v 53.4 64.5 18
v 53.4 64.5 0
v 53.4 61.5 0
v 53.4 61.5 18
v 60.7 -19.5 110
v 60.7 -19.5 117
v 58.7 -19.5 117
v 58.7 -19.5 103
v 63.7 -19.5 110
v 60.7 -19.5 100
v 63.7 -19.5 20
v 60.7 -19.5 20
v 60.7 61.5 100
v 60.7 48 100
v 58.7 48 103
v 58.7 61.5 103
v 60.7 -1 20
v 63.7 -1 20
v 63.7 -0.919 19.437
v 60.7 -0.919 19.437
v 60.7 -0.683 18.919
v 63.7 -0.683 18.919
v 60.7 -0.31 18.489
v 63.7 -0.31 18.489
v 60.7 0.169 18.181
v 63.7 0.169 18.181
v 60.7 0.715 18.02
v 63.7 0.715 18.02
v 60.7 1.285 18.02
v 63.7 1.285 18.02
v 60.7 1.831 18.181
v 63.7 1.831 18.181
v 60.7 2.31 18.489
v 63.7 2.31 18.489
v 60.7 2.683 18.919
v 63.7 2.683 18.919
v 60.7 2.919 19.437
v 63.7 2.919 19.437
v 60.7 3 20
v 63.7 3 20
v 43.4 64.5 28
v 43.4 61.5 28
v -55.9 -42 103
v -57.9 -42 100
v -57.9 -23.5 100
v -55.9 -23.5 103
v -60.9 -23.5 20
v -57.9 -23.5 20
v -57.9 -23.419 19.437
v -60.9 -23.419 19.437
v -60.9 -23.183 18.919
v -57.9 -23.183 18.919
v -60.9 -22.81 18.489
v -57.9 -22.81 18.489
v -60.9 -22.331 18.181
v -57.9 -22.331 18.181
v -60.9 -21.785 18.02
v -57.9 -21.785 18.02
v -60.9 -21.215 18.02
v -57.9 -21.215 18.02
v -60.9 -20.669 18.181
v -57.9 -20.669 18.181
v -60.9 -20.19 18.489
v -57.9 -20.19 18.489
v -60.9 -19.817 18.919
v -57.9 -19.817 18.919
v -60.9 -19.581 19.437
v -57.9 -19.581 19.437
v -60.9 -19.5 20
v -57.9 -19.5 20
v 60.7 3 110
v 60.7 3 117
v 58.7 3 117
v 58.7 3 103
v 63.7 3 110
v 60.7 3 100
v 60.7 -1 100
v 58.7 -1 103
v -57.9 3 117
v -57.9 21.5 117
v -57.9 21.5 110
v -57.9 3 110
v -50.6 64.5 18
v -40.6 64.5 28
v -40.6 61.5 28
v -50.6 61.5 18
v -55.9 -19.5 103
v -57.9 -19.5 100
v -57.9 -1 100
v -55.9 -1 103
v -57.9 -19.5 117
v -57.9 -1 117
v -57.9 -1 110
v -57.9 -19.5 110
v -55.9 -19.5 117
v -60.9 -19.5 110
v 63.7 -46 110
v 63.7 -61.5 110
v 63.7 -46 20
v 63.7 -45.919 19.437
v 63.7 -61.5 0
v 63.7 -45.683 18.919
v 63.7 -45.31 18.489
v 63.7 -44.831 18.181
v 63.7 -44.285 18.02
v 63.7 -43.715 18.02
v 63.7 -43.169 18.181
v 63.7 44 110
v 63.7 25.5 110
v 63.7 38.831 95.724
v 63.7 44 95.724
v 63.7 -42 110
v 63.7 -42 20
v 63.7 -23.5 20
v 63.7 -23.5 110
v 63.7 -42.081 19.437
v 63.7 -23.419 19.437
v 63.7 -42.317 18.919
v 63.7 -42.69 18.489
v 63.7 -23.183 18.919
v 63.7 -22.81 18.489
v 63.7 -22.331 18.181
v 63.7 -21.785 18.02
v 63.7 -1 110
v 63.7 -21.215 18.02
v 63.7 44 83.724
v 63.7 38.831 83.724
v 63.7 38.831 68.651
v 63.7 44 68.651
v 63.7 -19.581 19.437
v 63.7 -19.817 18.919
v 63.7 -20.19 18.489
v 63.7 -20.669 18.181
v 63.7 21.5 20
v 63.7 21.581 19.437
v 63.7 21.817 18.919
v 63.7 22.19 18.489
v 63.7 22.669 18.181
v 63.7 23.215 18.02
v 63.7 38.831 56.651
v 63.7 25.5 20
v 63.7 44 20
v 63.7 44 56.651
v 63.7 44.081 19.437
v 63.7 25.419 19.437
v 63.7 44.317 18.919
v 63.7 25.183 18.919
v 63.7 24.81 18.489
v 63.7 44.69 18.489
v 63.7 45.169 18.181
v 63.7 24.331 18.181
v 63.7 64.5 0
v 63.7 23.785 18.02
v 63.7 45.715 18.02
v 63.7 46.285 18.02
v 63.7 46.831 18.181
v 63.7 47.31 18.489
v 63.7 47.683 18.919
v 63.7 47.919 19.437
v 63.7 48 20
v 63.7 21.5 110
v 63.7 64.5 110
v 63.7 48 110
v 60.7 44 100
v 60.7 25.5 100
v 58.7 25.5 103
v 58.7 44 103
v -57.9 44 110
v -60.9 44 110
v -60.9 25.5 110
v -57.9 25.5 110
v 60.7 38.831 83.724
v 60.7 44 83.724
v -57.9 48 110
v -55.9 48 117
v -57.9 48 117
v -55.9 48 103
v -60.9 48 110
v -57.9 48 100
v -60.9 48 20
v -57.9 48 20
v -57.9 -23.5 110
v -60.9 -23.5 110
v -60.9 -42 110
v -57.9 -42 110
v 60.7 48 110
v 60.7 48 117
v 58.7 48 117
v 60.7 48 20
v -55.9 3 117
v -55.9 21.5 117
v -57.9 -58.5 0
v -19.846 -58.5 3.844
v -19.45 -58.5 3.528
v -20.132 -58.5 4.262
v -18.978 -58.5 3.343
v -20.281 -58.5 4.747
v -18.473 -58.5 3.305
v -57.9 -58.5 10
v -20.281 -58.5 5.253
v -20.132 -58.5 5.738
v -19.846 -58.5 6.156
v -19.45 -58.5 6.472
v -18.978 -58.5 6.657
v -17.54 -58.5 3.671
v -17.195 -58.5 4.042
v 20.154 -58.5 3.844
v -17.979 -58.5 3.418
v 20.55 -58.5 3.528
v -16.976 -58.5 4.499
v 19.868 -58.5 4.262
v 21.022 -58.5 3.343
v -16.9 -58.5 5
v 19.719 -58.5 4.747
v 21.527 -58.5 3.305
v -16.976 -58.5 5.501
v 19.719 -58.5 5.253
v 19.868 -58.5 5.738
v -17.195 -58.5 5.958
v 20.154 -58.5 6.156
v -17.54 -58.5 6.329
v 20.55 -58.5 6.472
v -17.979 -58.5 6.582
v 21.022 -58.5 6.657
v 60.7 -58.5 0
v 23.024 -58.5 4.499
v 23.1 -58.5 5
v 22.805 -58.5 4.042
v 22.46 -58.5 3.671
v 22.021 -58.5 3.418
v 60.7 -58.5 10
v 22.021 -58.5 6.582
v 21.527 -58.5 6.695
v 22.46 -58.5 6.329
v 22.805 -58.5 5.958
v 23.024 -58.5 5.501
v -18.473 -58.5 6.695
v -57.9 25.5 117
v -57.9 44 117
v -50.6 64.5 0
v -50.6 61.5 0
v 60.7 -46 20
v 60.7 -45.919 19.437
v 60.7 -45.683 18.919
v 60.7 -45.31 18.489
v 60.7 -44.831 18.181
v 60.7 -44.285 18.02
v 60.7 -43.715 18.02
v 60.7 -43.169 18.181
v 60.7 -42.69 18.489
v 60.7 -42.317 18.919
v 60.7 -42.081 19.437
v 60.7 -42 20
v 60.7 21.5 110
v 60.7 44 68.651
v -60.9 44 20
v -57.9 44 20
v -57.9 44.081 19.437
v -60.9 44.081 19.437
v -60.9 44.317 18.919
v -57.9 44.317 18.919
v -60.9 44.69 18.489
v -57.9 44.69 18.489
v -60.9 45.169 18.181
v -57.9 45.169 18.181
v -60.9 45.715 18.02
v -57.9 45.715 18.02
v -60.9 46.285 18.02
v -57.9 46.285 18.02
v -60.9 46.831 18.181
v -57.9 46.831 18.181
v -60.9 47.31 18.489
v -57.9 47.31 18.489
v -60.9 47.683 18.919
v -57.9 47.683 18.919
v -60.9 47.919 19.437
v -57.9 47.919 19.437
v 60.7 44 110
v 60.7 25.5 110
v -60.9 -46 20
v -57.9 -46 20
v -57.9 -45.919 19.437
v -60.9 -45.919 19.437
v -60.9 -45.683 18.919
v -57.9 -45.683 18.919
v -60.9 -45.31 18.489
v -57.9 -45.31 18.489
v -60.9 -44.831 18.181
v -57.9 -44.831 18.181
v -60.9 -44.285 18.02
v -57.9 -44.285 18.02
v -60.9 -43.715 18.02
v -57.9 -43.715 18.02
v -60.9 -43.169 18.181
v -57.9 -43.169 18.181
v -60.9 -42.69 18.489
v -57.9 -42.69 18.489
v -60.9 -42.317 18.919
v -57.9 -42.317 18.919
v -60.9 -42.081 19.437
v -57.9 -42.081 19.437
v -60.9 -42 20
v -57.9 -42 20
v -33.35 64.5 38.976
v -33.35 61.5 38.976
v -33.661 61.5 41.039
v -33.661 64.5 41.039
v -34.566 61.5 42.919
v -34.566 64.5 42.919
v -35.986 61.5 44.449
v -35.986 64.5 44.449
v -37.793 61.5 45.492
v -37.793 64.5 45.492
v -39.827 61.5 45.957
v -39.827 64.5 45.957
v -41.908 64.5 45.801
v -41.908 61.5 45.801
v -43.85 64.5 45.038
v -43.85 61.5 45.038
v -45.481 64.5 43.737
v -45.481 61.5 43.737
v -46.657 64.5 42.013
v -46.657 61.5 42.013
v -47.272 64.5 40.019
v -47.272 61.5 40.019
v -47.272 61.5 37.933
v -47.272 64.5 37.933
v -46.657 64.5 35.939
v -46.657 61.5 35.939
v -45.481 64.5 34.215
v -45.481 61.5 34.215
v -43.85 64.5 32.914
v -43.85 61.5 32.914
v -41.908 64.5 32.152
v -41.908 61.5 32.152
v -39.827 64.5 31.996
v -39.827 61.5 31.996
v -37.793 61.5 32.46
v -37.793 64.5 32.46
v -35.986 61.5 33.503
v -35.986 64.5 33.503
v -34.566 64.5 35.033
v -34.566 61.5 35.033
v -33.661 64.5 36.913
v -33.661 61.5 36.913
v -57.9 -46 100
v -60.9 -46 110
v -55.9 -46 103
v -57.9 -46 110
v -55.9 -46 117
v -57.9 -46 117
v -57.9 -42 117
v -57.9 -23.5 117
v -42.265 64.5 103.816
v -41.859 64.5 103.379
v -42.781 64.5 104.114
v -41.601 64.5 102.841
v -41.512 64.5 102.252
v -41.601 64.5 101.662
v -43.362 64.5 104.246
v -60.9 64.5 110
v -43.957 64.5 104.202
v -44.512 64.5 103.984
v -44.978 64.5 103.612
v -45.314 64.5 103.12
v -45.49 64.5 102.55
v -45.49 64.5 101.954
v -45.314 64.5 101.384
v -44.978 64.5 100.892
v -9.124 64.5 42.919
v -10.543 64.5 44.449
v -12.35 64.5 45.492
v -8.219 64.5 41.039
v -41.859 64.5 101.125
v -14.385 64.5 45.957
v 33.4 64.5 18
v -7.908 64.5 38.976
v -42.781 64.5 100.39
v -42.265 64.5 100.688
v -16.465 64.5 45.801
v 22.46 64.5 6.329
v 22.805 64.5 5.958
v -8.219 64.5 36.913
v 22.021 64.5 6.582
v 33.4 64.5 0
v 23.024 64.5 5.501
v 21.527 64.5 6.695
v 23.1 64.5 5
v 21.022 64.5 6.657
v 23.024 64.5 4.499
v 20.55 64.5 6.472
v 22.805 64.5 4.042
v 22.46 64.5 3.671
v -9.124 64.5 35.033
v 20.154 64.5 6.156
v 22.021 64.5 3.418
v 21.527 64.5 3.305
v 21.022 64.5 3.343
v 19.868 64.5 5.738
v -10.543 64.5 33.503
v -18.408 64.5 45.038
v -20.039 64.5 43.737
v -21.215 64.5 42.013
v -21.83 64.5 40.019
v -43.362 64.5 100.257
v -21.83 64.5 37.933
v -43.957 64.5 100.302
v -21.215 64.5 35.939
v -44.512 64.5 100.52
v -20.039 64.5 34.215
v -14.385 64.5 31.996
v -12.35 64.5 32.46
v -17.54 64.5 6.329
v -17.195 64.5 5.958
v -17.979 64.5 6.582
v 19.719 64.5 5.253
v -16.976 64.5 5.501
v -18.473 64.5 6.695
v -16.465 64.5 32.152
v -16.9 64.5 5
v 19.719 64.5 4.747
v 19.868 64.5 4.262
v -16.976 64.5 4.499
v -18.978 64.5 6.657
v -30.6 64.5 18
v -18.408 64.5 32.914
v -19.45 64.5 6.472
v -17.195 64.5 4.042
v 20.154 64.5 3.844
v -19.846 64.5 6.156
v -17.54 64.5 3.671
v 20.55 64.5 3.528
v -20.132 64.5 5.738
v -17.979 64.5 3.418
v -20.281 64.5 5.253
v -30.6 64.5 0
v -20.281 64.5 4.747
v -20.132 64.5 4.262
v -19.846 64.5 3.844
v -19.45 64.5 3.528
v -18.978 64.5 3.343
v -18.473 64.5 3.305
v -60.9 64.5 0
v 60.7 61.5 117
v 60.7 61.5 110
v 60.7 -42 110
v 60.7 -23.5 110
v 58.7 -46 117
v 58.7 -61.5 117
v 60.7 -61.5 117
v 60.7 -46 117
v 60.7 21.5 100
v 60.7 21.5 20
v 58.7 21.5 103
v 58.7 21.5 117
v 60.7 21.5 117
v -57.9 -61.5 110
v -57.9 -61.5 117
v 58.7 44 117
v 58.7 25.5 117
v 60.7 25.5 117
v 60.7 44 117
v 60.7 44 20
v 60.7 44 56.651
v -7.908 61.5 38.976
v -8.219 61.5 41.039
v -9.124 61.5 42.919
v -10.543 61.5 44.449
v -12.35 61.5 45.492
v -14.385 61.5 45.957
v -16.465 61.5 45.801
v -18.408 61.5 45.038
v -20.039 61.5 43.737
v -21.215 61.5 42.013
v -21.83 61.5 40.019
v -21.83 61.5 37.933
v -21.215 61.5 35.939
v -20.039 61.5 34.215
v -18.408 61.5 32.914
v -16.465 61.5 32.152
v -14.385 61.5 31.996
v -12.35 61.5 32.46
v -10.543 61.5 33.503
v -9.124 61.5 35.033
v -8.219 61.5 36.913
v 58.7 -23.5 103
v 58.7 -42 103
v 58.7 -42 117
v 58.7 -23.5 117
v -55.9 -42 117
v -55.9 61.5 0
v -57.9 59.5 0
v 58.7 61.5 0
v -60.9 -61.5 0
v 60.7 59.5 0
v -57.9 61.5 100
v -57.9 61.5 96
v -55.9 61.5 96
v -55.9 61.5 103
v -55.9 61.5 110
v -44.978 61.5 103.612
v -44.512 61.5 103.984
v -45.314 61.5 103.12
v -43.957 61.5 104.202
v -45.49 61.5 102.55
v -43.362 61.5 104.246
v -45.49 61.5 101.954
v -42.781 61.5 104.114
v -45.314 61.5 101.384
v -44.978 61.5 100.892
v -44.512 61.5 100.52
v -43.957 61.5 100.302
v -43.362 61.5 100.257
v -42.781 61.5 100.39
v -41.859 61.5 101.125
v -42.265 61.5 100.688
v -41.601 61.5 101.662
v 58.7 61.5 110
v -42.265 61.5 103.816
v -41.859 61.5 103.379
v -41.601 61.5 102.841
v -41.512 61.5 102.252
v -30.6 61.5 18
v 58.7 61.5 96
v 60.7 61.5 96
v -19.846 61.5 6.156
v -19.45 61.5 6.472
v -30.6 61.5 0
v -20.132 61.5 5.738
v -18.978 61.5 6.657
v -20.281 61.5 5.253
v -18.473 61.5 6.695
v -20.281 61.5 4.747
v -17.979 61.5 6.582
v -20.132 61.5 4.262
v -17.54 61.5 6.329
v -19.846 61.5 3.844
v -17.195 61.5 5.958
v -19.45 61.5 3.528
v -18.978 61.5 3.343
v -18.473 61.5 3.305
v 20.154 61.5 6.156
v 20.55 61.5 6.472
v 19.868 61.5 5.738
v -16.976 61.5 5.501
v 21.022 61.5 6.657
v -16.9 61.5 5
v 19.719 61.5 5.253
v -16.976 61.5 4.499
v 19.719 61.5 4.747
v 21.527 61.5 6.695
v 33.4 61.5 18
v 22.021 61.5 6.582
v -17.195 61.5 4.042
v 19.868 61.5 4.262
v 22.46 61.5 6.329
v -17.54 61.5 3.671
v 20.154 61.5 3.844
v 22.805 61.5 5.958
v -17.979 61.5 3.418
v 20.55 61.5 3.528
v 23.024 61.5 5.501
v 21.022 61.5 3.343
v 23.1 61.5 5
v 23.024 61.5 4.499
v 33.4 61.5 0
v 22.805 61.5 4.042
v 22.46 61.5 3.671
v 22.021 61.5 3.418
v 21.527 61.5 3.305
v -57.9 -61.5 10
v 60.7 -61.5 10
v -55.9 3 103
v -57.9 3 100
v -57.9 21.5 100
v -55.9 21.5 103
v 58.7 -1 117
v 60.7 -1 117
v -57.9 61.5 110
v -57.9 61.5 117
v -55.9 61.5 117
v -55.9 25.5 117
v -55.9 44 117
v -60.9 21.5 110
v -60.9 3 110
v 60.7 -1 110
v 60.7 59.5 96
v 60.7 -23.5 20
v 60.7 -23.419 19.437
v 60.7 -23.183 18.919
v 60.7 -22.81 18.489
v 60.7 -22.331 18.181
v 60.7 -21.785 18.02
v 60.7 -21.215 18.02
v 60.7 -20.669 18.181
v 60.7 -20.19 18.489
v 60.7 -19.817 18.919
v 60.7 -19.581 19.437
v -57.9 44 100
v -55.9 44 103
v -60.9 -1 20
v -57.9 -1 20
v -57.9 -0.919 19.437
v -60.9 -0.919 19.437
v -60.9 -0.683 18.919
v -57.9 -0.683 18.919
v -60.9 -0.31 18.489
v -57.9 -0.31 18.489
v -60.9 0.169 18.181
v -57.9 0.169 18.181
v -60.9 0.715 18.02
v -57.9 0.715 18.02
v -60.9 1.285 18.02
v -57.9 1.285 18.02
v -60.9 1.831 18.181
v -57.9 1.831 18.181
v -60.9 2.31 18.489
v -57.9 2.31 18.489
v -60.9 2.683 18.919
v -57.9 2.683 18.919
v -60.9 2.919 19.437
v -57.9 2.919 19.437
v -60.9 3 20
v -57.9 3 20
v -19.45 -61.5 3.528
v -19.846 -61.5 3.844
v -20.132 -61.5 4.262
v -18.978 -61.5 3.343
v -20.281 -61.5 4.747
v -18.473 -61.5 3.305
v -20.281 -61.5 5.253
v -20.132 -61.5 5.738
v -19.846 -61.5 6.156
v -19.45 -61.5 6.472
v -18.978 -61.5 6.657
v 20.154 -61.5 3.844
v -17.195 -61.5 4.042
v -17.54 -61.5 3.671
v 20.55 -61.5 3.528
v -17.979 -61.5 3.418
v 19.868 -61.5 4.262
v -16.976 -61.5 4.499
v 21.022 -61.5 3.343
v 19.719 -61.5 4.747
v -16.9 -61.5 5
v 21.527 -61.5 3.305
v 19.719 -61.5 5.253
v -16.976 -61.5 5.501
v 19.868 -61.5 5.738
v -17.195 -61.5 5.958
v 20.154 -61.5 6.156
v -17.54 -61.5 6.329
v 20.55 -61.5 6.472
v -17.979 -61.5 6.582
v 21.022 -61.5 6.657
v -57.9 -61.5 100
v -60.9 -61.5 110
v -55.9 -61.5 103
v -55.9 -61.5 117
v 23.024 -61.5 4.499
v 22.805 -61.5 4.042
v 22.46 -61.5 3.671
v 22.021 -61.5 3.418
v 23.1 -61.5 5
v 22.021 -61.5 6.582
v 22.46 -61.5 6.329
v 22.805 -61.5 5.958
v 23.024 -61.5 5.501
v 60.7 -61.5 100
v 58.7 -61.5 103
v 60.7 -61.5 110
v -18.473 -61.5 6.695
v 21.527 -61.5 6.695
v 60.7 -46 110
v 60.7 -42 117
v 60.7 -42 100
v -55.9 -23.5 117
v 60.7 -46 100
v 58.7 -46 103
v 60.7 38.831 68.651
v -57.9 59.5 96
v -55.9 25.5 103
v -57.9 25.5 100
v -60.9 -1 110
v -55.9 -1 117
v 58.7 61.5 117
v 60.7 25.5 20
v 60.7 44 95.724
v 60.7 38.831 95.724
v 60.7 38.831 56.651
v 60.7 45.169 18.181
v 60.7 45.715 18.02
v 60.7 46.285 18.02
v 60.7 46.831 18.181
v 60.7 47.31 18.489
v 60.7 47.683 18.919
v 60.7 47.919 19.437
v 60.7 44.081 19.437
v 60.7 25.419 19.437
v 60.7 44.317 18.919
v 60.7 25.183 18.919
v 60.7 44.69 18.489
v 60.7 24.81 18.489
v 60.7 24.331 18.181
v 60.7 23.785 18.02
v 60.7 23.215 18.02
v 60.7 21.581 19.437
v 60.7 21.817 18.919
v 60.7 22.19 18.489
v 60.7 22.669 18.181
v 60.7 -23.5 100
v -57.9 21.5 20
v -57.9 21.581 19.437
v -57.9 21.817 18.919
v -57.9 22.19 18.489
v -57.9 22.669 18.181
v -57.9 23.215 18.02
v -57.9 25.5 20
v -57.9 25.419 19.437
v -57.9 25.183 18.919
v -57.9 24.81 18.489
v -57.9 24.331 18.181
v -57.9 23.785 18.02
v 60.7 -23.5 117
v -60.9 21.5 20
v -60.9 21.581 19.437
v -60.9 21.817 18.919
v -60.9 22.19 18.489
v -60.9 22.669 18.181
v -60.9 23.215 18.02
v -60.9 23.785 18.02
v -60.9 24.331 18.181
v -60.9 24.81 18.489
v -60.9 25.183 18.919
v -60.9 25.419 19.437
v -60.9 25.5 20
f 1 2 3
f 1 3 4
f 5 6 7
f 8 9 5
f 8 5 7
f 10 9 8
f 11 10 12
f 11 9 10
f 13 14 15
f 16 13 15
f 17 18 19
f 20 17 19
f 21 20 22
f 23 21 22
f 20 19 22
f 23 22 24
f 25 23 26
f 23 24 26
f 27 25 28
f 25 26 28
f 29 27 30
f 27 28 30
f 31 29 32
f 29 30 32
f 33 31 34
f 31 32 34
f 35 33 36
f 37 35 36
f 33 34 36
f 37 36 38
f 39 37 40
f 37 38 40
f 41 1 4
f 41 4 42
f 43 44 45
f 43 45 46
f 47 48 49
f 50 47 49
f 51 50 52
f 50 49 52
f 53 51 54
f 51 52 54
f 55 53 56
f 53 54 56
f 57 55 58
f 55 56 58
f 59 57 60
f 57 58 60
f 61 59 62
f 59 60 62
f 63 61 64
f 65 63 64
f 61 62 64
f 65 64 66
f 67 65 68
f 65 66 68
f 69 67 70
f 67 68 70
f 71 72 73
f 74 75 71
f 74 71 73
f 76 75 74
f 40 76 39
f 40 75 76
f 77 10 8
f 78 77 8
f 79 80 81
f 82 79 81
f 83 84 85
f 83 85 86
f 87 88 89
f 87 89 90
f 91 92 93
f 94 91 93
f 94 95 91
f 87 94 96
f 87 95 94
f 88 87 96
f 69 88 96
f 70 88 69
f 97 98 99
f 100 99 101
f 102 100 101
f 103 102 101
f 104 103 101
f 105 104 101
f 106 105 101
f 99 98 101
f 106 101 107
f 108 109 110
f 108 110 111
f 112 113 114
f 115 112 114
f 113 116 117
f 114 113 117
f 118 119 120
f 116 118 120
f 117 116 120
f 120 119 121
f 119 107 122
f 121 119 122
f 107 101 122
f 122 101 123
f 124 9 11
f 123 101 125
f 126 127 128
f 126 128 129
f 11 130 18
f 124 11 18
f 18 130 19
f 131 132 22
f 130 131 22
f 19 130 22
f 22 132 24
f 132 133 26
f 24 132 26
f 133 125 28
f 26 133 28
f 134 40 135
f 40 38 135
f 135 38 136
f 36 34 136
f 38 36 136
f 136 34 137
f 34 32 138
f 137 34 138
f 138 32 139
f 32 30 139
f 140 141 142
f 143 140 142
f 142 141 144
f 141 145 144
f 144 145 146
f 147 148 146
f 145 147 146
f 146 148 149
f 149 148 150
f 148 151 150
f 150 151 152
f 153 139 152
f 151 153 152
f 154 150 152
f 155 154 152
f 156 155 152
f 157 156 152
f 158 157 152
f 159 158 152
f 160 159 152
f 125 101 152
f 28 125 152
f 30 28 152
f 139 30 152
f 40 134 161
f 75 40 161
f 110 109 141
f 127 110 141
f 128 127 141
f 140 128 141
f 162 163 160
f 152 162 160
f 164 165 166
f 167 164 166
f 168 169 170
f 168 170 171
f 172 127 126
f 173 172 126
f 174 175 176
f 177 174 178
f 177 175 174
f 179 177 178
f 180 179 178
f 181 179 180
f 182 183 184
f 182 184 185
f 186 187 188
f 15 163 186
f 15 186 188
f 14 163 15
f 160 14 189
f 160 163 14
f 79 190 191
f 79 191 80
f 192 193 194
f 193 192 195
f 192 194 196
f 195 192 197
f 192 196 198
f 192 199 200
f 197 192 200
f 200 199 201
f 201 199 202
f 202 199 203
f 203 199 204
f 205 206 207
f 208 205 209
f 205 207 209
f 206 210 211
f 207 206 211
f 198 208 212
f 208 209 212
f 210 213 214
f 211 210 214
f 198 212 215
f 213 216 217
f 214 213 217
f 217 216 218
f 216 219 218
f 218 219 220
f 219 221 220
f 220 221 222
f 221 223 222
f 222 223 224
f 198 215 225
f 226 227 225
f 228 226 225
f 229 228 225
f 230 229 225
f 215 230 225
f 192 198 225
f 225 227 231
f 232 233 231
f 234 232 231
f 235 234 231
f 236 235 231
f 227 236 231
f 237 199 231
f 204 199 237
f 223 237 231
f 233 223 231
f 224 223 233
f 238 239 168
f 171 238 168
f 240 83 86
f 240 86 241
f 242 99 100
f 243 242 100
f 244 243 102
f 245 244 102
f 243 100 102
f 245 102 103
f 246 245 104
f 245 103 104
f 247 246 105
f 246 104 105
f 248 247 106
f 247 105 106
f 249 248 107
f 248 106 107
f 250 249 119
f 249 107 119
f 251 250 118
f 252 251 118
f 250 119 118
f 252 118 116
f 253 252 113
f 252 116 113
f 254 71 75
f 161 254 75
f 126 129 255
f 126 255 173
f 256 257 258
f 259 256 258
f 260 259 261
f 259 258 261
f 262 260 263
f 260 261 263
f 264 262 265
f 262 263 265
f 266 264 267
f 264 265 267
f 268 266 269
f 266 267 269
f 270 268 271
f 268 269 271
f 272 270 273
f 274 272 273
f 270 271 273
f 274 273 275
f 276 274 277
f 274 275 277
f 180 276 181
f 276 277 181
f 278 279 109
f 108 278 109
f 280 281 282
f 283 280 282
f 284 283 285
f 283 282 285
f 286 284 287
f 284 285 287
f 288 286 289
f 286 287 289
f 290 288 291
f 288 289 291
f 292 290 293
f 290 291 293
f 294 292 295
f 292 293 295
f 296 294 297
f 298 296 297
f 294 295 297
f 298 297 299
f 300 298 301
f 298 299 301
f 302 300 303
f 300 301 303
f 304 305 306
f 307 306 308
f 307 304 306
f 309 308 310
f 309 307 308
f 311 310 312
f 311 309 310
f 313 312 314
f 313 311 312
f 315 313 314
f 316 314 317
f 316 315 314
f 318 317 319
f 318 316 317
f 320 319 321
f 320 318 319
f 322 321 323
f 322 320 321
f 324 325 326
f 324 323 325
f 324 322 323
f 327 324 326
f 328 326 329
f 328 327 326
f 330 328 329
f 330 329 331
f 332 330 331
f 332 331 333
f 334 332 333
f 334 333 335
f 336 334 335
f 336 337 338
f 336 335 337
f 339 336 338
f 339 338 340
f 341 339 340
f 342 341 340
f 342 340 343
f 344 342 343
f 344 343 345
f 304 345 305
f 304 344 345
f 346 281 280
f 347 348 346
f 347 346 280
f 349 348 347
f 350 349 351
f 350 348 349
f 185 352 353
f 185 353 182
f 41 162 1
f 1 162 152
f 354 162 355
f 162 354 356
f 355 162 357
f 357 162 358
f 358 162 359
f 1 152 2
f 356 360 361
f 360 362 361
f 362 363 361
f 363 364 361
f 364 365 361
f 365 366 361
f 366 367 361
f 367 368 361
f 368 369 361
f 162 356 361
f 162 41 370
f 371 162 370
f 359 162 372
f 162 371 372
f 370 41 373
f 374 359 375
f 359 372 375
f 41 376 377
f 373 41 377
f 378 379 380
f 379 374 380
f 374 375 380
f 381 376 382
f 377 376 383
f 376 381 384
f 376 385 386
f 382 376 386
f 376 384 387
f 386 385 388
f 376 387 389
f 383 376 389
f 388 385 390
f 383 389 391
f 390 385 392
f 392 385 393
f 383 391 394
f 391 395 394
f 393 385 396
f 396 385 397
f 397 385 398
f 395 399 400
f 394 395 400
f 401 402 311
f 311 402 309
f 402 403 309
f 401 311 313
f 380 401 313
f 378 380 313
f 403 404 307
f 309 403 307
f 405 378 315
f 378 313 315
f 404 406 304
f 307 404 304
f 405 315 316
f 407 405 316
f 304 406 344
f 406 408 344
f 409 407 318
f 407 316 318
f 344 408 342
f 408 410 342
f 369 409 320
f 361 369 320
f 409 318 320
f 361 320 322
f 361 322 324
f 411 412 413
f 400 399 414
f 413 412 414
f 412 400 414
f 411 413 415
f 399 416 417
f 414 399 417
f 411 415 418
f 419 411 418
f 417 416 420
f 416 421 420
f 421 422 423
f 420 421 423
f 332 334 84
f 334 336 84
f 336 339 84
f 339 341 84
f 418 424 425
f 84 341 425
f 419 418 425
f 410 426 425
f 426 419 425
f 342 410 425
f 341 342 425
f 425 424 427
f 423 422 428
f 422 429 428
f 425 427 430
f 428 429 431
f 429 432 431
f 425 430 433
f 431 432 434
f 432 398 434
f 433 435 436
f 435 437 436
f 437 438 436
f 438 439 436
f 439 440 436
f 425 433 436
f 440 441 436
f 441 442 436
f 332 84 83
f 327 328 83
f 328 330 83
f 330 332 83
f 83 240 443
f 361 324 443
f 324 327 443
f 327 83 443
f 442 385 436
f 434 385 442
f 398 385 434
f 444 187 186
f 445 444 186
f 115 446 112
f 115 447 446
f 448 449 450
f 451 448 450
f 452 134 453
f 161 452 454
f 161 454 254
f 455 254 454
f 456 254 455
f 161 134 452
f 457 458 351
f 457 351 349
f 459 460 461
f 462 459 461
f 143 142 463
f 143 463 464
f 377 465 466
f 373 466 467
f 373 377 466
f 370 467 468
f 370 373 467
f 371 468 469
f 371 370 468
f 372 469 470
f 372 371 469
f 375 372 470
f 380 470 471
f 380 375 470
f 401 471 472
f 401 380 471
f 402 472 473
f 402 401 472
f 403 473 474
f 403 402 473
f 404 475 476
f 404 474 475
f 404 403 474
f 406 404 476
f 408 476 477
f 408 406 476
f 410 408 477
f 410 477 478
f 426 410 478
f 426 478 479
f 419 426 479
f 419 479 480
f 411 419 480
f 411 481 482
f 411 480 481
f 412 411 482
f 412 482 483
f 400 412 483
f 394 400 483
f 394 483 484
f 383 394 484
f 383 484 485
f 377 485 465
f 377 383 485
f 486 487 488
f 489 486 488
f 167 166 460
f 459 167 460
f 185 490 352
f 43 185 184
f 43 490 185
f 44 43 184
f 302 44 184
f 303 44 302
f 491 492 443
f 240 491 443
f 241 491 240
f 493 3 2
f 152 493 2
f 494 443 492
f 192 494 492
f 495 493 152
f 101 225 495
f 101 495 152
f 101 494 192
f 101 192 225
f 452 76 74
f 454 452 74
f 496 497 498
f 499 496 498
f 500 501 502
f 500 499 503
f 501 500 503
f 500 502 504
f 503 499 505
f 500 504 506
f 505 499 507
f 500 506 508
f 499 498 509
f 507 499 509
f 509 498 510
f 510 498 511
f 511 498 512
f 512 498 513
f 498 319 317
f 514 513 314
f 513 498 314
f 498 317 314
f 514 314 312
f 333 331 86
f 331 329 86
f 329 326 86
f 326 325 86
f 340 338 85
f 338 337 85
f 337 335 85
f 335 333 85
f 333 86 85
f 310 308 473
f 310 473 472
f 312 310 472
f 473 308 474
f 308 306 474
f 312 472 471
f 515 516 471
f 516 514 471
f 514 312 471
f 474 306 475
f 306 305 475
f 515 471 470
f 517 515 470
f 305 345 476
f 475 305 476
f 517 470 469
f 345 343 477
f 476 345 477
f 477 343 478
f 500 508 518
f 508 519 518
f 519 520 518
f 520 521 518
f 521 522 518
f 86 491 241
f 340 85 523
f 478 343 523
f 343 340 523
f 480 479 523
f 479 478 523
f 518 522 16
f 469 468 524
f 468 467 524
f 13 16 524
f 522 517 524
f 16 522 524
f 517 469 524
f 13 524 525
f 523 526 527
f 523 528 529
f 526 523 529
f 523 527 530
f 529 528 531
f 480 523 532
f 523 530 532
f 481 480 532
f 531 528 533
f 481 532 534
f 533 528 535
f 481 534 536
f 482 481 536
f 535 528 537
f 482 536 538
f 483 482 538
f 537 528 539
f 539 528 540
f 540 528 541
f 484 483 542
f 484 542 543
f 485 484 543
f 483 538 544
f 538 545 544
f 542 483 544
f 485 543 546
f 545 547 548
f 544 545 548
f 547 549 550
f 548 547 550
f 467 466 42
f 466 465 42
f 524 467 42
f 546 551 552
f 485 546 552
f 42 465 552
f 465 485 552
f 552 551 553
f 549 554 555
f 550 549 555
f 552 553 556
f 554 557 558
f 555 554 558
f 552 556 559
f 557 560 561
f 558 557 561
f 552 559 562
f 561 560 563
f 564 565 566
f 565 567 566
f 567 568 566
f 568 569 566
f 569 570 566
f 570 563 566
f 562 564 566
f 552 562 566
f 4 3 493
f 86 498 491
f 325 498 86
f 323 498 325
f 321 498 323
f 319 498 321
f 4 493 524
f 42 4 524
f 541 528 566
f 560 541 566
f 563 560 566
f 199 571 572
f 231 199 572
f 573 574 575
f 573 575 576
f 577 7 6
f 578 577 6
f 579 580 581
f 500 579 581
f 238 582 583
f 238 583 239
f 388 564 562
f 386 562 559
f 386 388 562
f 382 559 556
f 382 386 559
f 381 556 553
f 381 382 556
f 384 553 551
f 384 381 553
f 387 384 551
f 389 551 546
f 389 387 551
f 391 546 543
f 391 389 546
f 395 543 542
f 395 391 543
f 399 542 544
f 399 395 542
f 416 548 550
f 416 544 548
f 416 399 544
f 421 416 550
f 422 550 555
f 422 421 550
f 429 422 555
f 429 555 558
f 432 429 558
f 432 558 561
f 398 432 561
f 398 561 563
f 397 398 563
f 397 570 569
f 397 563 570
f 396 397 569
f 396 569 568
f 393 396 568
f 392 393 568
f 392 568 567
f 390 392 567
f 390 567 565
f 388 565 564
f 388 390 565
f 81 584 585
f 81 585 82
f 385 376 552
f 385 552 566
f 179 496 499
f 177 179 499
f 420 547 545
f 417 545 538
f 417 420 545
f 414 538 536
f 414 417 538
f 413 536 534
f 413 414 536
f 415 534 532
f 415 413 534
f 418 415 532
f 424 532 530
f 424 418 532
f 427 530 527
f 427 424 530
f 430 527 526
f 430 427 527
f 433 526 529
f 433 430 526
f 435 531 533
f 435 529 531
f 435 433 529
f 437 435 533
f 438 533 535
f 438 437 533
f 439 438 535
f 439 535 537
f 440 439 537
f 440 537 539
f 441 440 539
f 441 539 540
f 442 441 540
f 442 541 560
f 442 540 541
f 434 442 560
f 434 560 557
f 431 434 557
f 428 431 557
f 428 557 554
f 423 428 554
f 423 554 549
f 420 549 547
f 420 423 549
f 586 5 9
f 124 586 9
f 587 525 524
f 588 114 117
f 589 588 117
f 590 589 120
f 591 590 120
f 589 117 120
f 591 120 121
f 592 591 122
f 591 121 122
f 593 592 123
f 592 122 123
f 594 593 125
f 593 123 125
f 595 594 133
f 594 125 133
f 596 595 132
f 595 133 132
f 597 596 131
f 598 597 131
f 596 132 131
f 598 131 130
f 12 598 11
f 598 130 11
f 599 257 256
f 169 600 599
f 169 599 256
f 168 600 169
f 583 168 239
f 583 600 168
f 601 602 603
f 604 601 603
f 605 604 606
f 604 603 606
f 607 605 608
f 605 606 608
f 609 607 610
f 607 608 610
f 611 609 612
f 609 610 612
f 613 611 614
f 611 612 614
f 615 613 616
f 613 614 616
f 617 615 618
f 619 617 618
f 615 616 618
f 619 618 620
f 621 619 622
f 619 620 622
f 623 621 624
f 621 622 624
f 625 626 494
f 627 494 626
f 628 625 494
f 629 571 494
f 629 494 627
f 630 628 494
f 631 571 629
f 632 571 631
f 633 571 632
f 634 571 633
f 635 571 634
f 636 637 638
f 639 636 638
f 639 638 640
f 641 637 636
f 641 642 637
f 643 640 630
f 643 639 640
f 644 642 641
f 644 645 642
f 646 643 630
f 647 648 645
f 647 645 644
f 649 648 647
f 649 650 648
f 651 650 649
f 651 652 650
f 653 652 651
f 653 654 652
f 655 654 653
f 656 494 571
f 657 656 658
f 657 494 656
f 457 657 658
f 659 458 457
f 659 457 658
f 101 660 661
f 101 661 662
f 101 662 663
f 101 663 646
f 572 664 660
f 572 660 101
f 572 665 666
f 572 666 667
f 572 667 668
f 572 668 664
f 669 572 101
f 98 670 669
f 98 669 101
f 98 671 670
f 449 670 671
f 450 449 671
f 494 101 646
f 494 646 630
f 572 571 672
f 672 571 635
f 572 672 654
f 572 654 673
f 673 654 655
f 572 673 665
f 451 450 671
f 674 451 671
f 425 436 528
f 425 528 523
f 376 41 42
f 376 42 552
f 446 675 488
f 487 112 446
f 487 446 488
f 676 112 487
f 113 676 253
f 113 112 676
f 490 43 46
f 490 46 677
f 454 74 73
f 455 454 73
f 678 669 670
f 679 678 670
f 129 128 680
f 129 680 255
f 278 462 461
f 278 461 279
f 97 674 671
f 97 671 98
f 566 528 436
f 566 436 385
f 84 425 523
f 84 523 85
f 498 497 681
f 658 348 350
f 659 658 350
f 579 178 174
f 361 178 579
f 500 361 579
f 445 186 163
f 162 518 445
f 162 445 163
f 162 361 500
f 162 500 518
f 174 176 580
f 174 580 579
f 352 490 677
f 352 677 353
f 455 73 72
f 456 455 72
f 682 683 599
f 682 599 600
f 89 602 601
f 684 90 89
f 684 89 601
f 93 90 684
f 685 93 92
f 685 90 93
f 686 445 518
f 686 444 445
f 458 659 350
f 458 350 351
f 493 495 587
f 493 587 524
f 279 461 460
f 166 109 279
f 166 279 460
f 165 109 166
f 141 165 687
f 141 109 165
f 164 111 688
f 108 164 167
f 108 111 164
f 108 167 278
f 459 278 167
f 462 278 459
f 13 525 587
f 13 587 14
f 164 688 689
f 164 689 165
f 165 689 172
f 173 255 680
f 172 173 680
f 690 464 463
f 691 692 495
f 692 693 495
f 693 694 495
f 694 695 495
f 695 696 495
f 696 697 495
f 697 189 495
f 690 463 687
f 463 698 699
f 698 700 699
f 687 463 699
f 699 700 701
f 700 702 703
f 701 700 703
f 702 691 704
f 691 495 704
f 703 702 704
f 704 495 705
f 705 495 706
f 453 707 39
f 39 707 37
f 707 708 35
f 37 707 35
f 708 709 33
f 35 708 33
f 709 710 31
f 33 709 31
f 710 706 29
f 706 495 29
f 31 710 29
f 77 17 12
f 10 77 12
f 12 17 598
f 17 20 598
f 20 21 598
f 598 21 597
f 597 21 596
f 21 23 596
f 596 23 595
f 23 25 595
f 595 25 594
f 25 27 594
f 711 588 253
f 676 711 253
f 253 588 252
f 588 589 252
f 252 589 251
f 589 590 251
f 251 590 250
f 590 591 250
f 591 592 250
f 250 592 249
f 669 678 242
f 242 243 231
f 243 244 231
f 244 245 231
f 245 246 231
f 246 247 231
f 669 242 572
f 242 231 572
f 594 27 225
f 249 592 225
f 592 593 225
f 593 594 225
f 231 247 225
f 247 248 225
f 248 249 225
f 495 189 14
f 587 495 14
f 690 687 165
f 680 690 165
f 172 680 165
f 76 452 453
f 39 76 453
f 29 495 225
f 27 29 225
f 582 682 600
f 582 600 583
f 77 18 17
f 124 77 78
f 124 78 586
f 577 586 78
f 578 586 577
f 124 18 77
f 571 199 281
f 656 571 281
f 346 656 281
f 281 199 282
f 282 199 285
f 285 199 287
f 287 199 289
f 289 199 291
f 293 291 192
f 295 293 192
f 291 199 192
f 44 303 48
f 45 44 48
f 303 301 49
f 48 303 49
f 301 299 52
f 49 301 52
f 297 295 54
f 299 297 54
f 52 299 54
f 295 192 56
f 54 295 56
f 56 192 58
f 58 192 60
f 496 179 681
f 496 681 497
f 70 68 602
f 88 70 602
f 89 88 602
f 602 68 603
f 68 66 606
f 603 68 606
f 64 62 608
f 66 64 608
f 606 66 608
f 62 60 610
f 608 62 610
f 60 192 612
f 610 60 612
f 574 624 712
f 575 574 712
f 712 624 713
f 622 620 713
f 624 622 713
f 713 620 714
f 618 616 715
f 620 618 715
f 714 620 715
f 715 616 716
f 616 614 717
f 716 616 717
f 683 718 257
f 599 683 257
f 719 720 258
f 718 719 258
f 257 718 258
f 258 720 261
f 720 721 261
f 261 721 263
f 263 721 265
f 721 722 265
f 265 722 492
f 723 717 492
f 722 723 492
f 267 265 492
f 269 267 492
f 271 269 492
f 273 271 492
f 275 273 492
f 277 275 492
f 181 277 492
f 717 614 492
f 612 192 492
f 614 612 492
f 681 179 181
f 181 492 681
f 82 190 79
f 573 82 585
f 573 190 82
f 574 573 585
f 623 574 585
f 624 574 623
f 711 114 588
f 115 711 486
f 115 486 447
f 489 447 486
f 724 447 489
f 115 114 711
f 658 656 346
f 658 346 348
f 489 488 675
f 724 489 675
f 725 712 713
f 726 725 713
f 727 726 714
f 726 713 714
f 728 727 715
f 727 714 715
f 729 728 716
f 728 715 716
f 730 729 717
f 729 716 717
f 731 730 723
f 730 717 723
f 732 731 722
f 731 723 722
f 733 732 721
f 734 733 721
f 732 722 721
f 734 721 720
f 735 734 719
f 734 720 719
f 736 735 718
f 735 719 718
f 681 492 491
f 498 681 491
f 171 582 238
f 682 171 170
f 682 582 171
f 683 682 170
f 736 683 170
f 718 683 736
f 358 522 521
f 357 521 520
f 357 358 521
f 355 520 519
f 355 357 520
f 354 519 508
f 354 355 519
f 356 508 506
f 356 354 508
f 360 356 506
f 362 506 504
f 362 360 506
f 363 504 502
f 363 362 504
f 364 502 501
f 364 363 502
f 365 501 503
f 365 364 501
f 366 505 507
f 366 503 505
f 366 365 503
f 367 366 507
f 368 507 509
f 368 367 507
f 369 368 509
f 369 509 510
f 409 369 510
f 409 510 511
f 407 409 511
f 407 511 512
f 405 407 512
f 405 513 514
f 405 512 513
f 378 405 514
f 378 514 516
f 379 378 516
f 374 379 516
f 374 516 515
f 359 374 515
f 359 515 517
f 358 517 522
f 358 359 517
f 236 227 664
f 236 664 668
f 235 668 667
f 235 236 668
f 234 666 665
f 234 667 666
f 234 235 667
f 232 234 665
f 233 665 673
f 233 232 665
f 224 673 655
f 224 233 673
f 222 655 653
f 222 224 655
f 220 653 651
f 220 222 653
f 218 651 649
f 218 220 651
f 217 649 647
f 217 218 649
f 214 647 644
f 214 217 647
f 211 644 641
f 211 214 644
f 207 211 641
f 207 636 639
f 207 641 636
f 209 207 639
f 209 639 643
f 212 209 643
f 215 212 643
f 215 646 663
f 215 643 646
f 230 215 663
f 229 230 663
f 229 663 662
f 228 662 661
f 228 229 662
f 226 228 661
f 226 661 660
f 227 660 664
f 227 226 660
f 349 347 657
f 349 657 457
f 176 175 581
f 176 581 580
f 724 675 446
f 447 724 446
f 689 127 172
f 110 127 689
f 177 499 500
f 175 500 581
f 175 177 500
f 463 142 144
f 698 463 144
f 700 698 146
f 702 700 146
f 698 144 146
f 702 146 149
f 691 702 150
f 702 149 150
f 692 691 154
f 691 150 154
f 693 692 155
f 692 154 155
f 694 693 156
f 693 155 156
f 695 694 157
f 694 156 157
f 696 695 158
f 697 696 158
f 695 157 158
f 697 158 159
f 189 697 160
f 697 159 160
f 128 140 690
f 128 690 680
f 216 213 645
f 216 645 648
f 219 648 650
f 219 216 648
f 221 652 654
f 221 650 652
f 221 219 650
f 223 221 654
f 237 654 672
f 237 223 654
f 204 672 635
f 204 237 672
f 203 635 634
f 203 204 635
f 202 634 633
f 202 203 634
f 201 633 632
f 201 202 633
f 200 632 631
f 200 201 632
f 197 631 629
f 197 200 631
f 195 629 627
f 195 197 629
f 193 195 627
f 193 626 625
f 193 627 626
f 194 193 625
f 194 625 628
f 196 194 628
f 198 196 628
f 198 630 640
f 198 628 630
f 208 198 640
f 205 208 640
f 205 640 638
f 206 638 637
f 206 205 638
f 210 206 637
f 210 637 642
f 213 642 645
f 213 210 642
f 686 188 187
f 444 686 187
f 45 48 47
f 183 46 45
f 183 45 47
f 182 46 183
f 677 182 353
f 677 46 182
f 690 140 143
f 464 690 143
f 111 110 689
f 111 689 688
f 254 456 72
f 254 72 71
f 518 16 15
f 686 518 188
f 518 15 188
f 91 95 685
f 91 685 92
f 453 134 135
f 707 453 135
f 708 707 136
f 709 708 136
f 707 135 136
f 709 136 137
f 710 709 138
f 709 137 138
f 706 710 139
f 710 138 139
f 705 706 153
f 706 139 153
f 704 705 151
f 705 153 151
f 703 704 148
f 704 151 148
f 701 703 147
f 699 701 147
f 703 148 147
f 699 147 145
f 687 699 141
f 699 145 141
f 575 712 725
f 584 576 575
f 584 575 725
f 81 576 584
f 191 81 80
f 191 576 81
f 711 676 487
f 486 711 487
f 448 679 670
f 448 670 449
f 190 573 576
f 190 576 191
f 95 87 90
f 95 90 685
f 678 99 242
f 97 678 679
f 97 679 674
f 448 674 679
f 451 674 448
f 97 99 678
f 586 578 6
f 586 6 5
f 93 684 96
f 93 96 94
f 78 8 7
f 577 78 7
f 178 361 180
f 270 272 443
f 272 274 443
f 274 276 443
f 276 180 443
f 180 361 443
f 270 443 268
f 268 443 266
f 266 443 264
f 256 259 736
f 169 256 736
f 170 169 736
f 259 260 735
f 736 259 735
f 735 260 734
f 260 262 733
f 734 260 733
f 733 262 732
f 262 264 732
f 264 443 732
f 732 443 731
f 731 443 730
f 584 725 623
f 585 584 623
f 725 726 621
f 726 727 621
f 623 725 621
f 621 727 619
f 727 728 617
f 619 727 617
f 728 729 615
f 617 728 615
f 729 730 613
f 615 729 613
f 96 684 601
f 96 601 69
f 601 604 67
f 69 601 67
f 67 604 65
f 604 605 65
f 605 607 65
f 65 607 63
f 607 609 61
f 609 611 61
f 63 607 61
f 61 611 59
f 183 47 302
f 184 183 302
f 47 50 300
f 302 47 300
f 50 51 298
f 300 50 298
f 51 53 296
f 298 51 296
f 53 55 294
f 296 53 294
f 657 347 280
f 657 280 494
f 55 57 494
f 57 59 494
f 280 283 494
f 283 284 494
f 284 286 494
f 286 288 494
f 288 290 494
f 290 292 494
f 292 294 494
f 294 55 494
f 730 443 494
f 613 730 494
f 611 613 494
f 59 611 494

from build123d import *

# Parameters (mm, degrees)
PAD_DEPTH           = 110
PAD001_DEPTH        = 96
SKETCH003_W         = 118.6
SKETCH003_H         = 10
PAD002_DEPTH        = 3
PAD003_DEPTH        = 123
POCKET001_DEPTH     = 124.601
LINEARPATTERN_COUNT = 5
LINEARPATTERN_PITCH = 22.5
SKETCH012_W         = 6
SKETCH012_H         = 12
POCKET_DEPTH        = 5
SKETCH013_R         = 1.7
POCKET004_DEPTH     = 126.001
SKETCH014_R         = 7
SKETCH014_R_2       = 2
POCKET005_DEPTH     = 5


with BuildPart() as part:
    # Sketch → Pad (new body)
    with BuildSketch(Plane.XY):
        Polygon((62.3, 64.5), (-62.3, 64.5), (-62.3, -61.5), (-59.3, -61.5), (-59.3, 61.5), (59.3, 61.5), (59.3, -61.5), (62.3, -61.5), align=None)
    extrude(amount=PAD_DEPTH)

    # Sketch001 → Pad001 (join)
    with BuildSketch(Plane.XY):
        Polygon((-59.3, 59.5), (-57.3, 61.5), (-59.3, 61.5), align=None)
    pad001 = extrude(amount=PAD001_DEPTH)

    # Mirrored: Pad001 across YZ
    add(pad001.mirror(Plane.YZ))

    # Sketch003 (on DatumPlane) → Pad002 (join)
    with BuildSketch(Plane.XZ.offset(61.5)):
        with Locations((0, 5)):
            Rectangle(SKETCH003_W, SKETCH003_H)
    extrude(amount=-PAD002_DEPTH)

    # Sketch004 (on DatumPlane) → Pad003 (join)
    with BuildSketch(Plane.XZ.offset(61.5)):
        Polygon((-57.3, 117), (-59.3, 117), (-59.3, 100), (-57.3, 103), align=None)
        Polygon((57.3, 103), (57.3, 117), (59.3, 117), (59.3, 100), align=None)
    extrude(amount=-PAD003_DEPTH)

    # Sketch009 (on DatumPlane) → Pocket001 (cut, through all)
    with BuildSketch(Plane.YZ.offset(62.3)):
        with BuildLine():
            Line((-46, 20), (-46, 243))
            ThreePointArc((-42, 243), (-44, 245), (-46, 243))
            Line((-42, 243), (-42, 20))
            ThreePointArc((-46, 20), (-44, 18), (-42, 20))
        make_face()
    pocket001 = extrude(amount=-POCKET001_DEPTH, mode=Mode.SUBTRACT)

    # LinearPattern: Pocket001 ×5
    with Locations(*[(0, i * LINEARPATTERN_PITCH, 0) for i in range(1, LINEARPATTERN_COUNT)]):
        add(pocket001, mode=Mode.SUBTRACT)

    # Sketch012 (on DatumPlane) → Pocket (cut)
    with BuildSketch(Plane.YZ.offset(62.3)):
        with Locations((41.830656, 89.723986)):
            Rectangle(SKETCH012_W, SKETCH012_H)
        with Locations((41.830656, 62.651357)):
            Rectangle(SKETCH012_W, SKETCH012_H)
    extrude(amount=-POCKET_DEPTH, mode=Mode.SUBTRACT)

    # Sketch013 (on DatumPlane) → Pocket004 (cut, through all)
    with BuildSketch(Plane.XZ.offset(-64.5)):
        with Locations((20, 5)):
            Circle(SKETCH013_R)
        with Locations((-20, 5)):
            Circle(SKETCH013_R)
    extrude(amount=POCKET004_DEPTH, mode=Mode.SUBTRACT)

    # Sketch014 (on DatumPlane) → Pocket005 (cut)
    with BuildSketch(Plane.XZ.offset(-64.5)):
        with Locations((-16.307726, 38.976202)):
            Circle(SKETCH014_R)
        with Locations((-41.75, 38.976202)):
            Circle(SKETCH014_R)
        with Locations((-44.911871, 102.251883)):
            Circle(SKETCH014_R_2)
        Polygon((32, 0), (52, 0), (52, 18), (42, 28), (32, 18), align=None)
        Polygon((-52, 0), (-32, 0), (-32, 18), (-42, 28), (-52, 18), align=None)
    extrude(amount=POCKET005_DEPTH, mode=Mode.SUBTRACT)


with BuildPart() as part_1:
    # Body placement: moved
    add(part.part.moved(Location((1.4, 0, 0))))


solid = part_1.part
